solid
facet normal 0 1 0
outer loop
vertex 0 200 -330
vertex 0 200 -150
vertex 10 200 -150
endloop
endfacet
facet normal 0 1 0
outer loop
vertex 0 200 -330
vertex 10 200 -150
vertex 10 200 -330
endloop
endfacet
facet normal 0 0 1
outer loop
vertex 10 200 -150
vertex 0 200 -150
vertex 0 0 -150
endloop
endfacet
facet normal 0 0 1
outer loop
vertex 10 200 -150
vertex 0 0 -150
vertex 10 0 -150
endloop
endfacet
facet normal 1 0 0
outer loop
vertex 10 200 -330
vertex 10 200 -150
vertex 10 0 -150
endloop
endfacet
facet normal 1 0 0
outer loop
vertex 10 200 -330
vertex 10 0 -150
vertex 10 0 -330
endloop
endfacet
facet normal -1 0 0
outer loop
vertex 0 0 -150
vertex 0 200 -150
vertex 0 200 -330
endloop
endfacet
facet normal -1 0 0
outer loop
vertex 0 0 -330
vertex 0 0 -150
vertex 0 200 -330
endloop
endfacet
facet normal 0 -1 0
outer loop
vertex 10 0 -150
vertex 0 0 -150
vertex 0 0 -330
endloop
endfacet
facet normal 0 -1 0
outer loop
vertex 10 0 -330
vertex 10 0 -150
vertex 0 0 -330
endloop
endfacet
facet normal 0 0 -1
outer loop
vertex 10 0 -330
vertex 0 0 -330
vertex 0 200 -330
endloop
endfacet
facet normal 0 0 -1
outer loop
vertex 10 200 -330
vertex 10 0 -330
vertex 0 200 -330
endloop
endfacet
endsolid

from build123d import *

# Parameters (mm, degrees)
SKETCH2_W               = 330
SKETCH2_H               = 200
BOSS_EXTRUDE1_DEPTH     = 10
SKETCH3_R               = 5
CUT_EXTRUDE1_DEPTH      = 10
MIRROR2_COPY_1_SKETCH_R = 5
MIRROR2_COPY_1_DEPTH    = 10
SKETCH4_W               = 10
SKETCH4_H               = 200
CUT_EXTRUDE2_DEPTH      = 150


with BuildPart() as part:
    # Sketch2 → Boss-Extrude1 (new body)
    with BuildSketch(Plane(origin=(0, 0, 0), x_dir=(0, 0, -1), z_dir=(1, 0, 0))):
        with Locations((165, 100)):
            Rectangle(SKETCH2_W, SKETCH2_H)
    extrude(amount=BOSS_EXTRUDE1_DEPTH)

    # Sketch3 → Cut-Extrude1 (cut)
    with BuildSketch(Plane(origin=(10, 0, 0), x_dir=(0, 0, -1), z_dir=(1, 0, 0))):
        with Locations((16, 25)):
            Circle(SKETCH3_R)
    cut_extrude1 = extrude(amount=-CUT_EXTRUDE1_DEPTH, mode=Mode.SUBTRACT)

    # Mirror1: Cut-Extrude1 across plane
    add(cut_extrude1.mirror(Plane.ZX.offset(50)), mode=Mode.SUBTRACT)

    # Mirror2: Cut-Extrude1 across plane
    add(cut_extrude1.mirror(Plane.ZX.offset(100)), mode=Mode.SUBTRACT)

    # Mirror2 copy 1 sketch → Mirror2 copy 1 (cut)
    with BuildSketch(Plane(origin=(10, 100, 0), x_dir=(0, 0, -1), z_dir=(1, 0, 0))):
        with Locations((16, 25)):
            Circle(MIRROR2_COPY_1_SKETCH_R)
    extrude(amount=-MIRROR2_COPY_1_DEPTH, mode=Mode.SUBTRACT)

    # Sketch4 → Cut-Extrude2 (cut)
    with BuildSketch(Plane.XY):
        with Locations((5, 100)):
            Rectangle(SKETCH4_W, SKETCH4_H)
    extrude(amount=-CUT_EXTRUDE2_DEPTH, mode=Mode.SUBTRACT)


solid = part.part
